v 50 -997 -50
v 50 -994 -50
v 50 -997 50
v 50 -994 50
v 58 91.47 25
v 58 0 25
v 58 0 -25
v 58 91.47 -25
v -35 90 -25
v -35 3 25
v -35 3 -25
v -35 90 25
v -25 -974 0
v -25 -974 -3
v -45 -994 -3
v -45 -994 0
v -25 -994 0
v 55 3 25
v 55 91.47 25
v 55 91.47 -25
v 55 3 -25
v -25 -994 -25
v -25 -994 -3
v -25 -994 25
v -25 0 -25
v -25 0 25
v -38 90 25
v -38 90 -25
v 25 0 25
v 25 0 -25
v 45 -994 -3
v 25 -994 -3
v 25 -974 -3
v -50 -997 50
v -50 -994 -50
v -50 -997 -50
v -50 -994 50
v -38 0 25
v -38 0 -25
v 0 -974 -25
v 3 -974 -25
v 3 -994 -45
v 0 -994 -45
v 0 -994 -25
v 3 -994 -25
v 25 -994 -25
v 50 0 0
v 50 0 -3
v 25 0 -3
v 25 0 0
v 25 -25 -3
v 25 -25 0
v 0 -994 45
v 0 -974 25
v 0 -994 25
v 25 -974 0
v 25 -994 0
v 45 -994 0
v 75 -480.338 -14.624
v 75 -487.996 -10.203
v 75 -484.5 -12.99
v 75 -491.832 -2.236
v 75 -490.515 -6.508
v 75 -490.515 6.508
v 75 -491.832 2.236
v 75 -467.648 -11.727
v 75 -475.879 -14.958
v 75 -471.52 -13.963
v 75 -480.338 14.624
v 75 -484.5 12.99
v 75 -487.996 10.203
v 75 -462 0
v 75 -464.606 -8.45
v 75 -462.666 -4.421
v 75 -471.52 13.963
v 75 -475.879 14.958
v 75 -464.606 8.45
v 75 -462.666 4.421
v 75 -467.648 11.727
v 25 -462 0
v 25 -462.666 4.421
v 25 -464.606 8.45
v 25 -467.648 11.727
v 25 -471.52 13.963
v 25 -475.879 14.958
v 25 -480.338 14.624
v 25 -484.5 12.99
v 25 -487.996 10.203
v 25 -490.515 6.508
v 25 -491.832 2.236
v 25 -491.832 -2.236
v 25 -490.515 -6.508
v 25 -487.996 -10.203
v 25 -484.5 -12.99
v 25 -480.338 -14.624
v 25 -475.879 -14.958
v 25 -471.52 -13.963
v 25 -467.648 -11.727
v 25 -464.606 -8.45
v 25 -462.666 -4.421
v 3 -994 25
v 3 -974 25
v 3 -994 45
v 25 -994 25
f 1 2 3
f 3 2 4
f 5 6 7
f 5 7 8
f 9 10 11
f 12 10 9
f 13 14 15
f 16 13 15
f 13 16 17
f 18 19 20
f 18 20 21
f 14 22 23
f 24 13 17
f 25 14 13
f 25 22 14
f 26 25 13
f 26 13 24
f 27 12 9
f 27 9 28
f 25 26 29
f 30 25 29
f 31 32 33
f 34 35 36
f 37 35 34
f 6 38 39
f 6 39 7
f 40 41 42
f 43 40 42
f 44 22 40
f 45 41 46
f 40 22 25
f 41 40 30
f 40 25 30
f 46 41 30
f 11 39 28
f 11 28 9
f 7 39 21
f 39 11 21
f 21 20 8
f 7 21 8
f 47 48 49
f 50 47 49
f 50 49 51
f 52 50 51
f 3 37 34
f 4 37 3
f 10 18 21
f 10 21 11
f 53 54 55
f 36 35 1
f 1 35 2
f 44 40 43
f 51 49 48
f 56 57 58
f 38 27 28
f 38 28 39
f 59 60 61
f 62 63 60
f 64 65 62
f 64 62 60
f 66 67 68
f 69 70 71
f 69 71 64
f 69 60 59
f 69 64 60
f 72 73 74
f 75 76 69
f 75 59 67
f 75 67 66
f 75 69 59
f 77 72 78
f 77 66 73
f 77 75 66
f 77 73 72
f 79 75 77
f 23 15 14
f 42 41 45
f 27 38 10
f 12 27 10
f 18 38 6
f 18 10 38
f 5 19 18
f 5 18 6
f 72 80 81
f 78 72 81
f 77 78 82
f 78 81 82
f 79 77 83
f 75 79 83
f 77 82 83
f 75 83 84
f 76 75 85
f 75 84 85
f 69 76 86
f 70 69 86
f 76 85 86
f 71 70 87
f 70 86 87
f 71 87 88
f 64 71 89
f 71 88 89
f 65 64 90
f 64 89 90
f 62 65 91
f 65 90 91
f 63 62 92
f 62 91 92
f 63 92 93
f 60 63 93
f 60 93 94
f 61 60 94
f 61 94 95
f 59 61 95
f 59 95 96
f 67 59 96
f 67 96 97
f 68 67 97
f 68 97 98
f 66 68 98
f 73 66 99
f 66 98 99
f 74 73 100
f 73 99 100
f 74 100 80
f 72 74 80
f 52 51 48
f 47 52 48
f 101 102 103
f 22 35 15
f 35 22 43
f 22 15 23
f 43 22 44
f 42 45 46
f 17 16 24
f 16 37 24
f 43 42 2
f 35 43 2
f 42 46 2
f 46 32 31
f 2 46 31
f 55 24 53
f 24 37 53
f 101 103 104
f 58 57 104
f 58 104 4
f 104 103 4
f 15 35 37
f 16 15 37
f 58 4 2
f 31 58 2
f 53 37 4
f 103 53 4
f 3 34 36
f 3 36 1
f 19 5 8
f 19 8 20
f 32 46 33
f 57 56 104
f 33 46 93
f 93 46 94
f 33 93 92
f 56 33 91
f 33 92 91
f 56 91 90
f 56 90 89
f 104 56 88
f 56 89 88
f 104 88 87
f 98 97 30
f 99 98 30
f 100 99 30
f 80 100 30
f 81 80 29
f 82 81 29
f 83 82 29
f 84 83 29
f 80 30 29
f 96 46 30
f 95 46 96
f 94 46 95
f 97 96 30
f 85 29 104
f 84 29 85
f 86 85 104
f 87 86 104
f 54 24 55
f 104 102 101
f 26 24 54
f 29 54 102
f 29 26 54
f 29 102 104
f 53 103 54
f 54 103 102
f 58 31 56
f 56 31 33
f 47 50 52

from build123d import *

# Parameters (mm, degrees)
F0_W      = 50
F0_H      = 50
F1_DEPTH  = 994
F3_W      = 100
F3_H      = 100
F4_DEPTH  = 3
F7_DEPTH  = 3
F10_DEPTH = 3
F13_DEPTH = 50
F15_DEPTH = 3
F17_R     = 15
F18_DEPTH = 50


with BuildPart() as f1:
    # F0 (on Front) → F1 (new body)
    with BuildSketch(Plane.XZ):
        Rectangle(F0_W, F0_H)
    extrude(amount=F1_DEPTH)

    # F3 (on offset) → F4 (join)
    with BuildSketch(Plane.XZ.offset(994)):
        Rectangle(F3_W, F3_H)
    extrude(amount=F4_DEPTH)

    # F6 (on offset) → F7 (join)
    with BuildSketch(Plane.XY.offset(-3)):
        Polygon((-25, -994), (-25, -974), (-45, -994), align=None)
        Polygon((45, -994), (25, -974), (25, -994), align=None)
    extrude(amount=F7_DEPTH)

    # F9 (on offset) → F10 (join)
    with BuildSketch(Plane(origin=(3, 0, 0), x_dir=(0, -1, 0), z_dir=(-1, 0, 0))):
        Polygon((974, 25), (994, 25), (994, 45), align=None)
        Polygon((994, -45), (994, -25), (974, -25), align=None)
    extrude(amount=F10_DEPTH)

    # F17 (on offset) → F18 (join)
    with BuildSketch(Plane.YZ.offset(25)):
        with Locations((-477, 0)):
            Circle(F17_R)
    extrude(amount=F18_DEPTH)


with BuildPart() as f13:
    # F12 (on offset) → F13 (new body)
    with BuildSketch(Plane.XY.offset(25)):
        Polygon((-38, 0), (58, 0), (58, 91.4704948664), (55, 91.4704948664), (55, 3), (-35, 3), (-35, 90), (-38, 90), align=None)
    extrude(amount=-F13_DEPTH)


with BuildPart() as f15:
    # F14 (on offset) → F15 (new body)
    with BuildSketch(Plane.XY.offset(-3)):
        Polygon((25, 0), (25, -25), (50, 0), align=None)
    extrude(amount=F15_DEPTH)


solid = Compound([f1.part, f13.part, f15.part])
